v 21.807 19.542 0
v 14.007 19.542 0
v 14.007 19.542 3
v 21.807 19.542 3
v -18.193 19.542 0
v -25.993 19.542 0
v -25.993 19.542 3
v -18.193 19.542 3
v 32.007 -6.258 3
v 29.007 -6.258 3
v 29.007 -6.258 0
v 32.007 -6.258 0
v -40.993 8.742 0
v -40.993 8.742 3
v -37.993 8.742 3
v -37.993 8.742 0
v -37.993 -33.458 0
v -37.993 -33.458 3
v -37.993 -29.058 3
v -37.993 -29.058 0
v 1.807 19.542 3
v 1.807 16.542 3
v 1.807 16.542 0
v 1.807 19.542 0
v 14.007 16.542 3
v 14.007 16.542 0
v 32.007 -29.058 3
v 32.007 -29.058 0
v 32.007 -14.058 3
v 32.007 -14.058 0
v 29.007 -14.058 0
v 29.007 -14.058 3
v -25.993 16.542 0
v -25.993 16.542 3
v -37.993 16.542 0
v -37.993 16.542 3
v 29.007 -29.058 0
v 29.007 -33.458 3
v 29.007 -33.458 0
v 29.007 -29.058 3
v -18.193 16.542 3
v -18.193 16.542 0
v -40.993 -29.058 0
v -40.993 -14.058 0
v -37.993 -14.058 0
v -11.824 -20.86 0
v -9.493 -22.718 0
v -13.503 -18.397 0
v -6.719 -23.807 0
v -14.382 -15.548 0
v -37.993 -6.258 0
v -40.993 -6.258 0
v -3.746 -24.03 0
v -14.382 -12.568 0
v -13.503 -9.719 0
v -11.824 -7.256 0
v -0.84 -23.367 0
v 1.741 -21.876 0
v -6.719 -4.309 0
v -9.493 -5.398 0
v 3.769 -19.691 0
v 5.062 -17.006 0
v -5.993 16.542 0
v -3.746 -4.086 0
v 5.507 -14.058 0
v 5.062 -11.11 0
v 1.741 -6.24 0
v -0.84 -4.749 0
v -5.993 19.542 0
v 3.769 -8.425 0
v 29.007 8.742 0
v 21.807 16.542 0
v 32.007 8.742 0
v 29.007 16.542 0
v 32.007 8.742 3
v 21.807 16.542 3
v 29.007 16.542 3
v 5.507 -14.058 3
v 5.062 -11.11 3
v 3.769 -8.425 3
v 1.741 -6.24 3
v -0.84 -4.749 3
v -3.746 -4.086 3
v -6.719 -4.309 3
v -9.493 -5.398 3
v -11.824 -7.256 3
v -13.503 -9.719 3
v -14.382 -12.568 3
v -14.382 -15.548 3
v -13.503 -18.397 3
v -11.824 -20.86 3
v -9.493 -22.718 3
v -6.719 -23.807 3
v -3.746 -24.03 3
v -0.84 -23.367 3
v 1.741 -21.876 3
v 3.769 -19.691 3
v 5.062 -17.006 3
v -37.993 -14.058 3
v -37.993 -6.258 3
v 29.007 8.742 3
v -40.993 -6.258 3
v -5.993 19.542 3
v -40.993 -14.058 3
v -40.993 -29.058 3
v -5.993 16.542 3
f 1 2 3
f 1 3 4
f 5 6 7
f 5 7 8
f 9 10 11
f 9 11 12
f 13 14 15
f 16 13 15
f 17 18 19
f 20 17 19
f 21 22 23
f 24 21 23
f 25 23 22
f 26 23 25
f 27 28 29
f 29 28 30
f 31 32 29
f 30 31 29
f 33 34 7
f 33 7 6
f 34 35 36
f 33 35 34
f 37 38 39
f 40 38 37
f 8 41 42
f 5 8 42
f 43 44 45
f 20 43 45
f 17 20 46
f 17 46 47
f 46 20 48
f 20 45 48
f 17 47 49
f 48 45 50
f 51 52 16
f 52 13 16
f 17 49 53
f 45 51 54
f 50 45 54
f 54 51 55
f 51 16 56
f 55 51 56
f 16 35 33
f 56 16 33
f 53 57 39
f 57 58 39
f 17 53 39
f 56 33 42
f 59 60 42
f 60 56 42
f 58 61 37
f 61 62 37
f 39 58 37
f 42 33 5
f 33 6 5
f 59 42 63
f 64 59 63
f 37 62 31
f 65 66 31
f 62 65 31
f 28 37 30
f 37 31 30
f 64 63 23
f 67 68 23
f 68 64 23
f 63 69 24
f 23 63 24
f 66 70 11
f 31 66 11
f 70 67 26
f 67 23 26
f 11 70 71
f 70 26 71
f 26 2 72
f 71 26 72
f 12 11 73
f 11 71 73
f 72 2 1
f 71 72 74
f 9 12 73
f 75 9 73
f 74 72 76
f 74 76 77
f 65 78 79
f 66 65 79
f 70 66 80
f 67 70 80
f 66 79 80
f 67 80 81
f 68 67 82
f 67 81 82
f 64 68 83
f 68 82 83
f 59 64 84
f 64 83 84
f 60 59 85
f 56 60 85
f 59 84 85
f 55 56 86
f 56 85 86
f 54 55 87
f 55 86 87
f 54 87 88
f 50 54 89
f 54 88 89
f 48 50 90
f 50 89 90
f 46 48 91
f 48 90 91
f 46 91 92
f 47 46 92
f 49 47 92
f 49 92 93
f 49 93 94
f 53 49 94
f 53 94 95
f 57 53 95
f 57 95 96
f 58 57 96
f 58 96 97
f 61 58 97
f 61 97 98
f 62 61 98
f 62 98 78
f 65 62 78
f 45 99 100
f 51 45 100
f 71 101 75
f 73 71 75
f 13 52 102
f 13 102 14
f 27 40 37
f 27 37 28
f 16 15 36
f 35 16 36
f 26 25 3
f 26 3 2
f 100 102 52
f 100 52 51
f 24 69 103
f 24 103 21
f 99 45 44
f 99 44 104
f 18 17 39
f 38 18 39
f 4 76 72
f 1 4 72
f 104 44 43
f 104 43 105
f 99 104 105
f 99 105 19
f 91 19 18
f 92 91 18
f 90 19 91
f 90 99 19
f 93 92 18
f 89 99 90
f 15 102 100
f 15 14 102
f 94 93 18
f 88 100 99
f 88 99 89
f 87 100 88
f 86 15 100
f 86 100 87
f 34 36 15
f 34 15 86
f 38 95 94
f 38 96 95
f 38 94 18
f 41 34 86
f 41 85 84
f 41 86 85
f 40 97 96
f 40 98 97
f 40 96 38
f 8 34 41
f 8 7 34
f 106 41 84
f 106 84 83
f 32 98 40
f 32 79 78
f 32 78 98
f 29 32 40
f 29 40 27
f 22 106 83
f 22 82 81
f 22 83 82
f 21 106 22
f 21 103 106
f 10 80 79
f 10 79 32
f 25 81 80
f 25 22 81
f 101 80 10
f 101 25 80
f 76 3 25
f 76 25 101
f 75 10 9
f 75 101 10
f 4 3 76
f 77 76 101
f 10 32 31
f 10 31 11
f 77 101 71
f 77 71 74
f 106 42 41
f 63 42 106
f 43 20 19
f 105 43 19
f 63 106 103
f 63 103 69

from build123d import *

# Parameters (mm, degrees)
SKETCH1_W           = 73
SKETCH1_H           = 50
BOSS_EXTRUDE1_DEPTH = 3
SKETCH2_W           = 3
SKETCH2_H           = 7.8
CUT_EXTRUDE1_DEPTH  = 53.999062732
LPATTERN1_COUNT     = 3
LPATTERN1_PITCH     = 22.8
SKETCH3_W           = 3
SKETCH3_H           = 7.8
CUT_EXTRUDE2_DEPTH  = 53.999062732
LPATTERN2_COUNT     = 4
LPATTERN2_PITCH     = 22.8
SKETCH6_W           = 3
SKETCH6_H           = 19.4
CUT_EXTRUDE3_DEPTH  = 10
SKETCH7_W           = 7.8
SKETCH7_H           = 3
BOSS_EXTRUDE2_DEPTH = 3
LPATTERN3_COUNT     = 3
LPATTERN3_PITCH     = 20
SKETCH8_W           = 3
SKETCH8_H           = 15
BOSS_EXTRUDE3_DEPTH = 3
CUT_EXTRUDE4_REACH  = 54.999
SKETCH9_R           = 10


with BuildPart() as part:
    # Sketch1 → Boss-Extrude1 (new body)
    with BuildSketch(Plane.XY):
        with Locations((-4.493460648, -8.457986111)):
            Rectangle(SKETCH1_W, SKETCH1_H)
    extrude(amount=BOSS_EXTRUDE1_DEPTH)

    # Sketch2 → Cut-Extrude1 (cut, through all)
    with BuildSketch(Plane.XY.offset(3)):
        with Locations((-39.493460648, 12.642013889)):
            Rectangle(SKETCH2_W, SKETCH2_H)
    cut_extrude1 = extrude(amount=-CUT_EXTRUDE1_DEPTH, mode=Mode.SUBTRACT)

    # LPattern1: Cut-Extrude1 ×3
    with Locations(*[(0, -i * LPATTERN1_PITCH, 0) for i in range(1, LPATTERN1_COUNT)]):
        add(cut_extrude1, mode=Mode.SUBTRACT)

    # Sketch3 → Cut-Extrude2 (cut, through all)
    with BuildSketch(Plane.XY.offset(3)):
        with Locations((30.506539352, 12.642013889)):
            Rectangle(SKETCH3_W, SKETCH3_H)
    cut_extrude2 = extrude(amount=-CUT_EXTRUDE2_DEPTH, mode=Mode.SUBTRACT)

    # LPattern2: Cut-Extrude2 ×4
    with Locations(*[(0, -i * LPATTERN2_PITCH, 0) for i in range(1, LPATTERN2_COUNT)]):
        add(cut_extrude2, mode=Mode.SUBTRACT)

    # Sketch6 → Cut-Extrude3 (cut)
    with BuildSketch(Plane.XY.offset(3)):
        with Locations((-39.493460648, -23.757986111)):
            Rectangle(SKETCH6_W, SKETCH6_H)
    extrude(amount=-CUT_EXTRUDE3_DEPTH, mode=Mode.SUBTRACT)

    # Sketch7 → Boss-Extrude2 (add)
    with BuildSketch(Plane(origin=(0, 16.542013889, 0), x_dir=(1, 0, 0), z_dir=(0, 1, 0))):
        with Locations((-22.093460648, -1.5)):
            Rectangle(SKETCH7_W, SKETCH7_H)
    boss_extrude2 = extrude(amount=BOSS_EXTRUDE2_DEPTH)

    # LPattern3: Boss-Extrude2 ×3
    with Locations(*[(i * LPATTERN3_PITCH, 0, 0) for i in range(1, LPATTERN3_COUNT)]):
        add(boss_extrude2)

    # Sketch8 → Boss-Extrude3 (add)
    with BuildSketch(Plane.ZY.offset(37.993460648)):
        with Locations((1.5, -21.557986111)):
            Rectangle(SKETCH8_W, SKETCH8_H)
    extrude(amount=BOSS_EXTRUDE3_DEPTH)

    # Sketch9 → Cut-Extrude4 (cut, up to next)
    with BuildSketch(Plane.XY.offset(3), mode=Mode.PRIVATE) as cut_extrude4_sk1:
        with Locations((-4.493460648, -14.057986111)):
            Circle(SKETCH9_R)
    cut_extrude4_tool1 = extrude(cut_extrude4_sk1.sketch, amount=-CUT_EXTRUDE4_REACH, mode=Mode.PRIVATE) & part.part
    add(cut_extrude4_tool1.solids().sort_by_distance((-4.493461, -14.057986, 3))[0], mode=Mode.SUBTRACT)


solid = part.part
